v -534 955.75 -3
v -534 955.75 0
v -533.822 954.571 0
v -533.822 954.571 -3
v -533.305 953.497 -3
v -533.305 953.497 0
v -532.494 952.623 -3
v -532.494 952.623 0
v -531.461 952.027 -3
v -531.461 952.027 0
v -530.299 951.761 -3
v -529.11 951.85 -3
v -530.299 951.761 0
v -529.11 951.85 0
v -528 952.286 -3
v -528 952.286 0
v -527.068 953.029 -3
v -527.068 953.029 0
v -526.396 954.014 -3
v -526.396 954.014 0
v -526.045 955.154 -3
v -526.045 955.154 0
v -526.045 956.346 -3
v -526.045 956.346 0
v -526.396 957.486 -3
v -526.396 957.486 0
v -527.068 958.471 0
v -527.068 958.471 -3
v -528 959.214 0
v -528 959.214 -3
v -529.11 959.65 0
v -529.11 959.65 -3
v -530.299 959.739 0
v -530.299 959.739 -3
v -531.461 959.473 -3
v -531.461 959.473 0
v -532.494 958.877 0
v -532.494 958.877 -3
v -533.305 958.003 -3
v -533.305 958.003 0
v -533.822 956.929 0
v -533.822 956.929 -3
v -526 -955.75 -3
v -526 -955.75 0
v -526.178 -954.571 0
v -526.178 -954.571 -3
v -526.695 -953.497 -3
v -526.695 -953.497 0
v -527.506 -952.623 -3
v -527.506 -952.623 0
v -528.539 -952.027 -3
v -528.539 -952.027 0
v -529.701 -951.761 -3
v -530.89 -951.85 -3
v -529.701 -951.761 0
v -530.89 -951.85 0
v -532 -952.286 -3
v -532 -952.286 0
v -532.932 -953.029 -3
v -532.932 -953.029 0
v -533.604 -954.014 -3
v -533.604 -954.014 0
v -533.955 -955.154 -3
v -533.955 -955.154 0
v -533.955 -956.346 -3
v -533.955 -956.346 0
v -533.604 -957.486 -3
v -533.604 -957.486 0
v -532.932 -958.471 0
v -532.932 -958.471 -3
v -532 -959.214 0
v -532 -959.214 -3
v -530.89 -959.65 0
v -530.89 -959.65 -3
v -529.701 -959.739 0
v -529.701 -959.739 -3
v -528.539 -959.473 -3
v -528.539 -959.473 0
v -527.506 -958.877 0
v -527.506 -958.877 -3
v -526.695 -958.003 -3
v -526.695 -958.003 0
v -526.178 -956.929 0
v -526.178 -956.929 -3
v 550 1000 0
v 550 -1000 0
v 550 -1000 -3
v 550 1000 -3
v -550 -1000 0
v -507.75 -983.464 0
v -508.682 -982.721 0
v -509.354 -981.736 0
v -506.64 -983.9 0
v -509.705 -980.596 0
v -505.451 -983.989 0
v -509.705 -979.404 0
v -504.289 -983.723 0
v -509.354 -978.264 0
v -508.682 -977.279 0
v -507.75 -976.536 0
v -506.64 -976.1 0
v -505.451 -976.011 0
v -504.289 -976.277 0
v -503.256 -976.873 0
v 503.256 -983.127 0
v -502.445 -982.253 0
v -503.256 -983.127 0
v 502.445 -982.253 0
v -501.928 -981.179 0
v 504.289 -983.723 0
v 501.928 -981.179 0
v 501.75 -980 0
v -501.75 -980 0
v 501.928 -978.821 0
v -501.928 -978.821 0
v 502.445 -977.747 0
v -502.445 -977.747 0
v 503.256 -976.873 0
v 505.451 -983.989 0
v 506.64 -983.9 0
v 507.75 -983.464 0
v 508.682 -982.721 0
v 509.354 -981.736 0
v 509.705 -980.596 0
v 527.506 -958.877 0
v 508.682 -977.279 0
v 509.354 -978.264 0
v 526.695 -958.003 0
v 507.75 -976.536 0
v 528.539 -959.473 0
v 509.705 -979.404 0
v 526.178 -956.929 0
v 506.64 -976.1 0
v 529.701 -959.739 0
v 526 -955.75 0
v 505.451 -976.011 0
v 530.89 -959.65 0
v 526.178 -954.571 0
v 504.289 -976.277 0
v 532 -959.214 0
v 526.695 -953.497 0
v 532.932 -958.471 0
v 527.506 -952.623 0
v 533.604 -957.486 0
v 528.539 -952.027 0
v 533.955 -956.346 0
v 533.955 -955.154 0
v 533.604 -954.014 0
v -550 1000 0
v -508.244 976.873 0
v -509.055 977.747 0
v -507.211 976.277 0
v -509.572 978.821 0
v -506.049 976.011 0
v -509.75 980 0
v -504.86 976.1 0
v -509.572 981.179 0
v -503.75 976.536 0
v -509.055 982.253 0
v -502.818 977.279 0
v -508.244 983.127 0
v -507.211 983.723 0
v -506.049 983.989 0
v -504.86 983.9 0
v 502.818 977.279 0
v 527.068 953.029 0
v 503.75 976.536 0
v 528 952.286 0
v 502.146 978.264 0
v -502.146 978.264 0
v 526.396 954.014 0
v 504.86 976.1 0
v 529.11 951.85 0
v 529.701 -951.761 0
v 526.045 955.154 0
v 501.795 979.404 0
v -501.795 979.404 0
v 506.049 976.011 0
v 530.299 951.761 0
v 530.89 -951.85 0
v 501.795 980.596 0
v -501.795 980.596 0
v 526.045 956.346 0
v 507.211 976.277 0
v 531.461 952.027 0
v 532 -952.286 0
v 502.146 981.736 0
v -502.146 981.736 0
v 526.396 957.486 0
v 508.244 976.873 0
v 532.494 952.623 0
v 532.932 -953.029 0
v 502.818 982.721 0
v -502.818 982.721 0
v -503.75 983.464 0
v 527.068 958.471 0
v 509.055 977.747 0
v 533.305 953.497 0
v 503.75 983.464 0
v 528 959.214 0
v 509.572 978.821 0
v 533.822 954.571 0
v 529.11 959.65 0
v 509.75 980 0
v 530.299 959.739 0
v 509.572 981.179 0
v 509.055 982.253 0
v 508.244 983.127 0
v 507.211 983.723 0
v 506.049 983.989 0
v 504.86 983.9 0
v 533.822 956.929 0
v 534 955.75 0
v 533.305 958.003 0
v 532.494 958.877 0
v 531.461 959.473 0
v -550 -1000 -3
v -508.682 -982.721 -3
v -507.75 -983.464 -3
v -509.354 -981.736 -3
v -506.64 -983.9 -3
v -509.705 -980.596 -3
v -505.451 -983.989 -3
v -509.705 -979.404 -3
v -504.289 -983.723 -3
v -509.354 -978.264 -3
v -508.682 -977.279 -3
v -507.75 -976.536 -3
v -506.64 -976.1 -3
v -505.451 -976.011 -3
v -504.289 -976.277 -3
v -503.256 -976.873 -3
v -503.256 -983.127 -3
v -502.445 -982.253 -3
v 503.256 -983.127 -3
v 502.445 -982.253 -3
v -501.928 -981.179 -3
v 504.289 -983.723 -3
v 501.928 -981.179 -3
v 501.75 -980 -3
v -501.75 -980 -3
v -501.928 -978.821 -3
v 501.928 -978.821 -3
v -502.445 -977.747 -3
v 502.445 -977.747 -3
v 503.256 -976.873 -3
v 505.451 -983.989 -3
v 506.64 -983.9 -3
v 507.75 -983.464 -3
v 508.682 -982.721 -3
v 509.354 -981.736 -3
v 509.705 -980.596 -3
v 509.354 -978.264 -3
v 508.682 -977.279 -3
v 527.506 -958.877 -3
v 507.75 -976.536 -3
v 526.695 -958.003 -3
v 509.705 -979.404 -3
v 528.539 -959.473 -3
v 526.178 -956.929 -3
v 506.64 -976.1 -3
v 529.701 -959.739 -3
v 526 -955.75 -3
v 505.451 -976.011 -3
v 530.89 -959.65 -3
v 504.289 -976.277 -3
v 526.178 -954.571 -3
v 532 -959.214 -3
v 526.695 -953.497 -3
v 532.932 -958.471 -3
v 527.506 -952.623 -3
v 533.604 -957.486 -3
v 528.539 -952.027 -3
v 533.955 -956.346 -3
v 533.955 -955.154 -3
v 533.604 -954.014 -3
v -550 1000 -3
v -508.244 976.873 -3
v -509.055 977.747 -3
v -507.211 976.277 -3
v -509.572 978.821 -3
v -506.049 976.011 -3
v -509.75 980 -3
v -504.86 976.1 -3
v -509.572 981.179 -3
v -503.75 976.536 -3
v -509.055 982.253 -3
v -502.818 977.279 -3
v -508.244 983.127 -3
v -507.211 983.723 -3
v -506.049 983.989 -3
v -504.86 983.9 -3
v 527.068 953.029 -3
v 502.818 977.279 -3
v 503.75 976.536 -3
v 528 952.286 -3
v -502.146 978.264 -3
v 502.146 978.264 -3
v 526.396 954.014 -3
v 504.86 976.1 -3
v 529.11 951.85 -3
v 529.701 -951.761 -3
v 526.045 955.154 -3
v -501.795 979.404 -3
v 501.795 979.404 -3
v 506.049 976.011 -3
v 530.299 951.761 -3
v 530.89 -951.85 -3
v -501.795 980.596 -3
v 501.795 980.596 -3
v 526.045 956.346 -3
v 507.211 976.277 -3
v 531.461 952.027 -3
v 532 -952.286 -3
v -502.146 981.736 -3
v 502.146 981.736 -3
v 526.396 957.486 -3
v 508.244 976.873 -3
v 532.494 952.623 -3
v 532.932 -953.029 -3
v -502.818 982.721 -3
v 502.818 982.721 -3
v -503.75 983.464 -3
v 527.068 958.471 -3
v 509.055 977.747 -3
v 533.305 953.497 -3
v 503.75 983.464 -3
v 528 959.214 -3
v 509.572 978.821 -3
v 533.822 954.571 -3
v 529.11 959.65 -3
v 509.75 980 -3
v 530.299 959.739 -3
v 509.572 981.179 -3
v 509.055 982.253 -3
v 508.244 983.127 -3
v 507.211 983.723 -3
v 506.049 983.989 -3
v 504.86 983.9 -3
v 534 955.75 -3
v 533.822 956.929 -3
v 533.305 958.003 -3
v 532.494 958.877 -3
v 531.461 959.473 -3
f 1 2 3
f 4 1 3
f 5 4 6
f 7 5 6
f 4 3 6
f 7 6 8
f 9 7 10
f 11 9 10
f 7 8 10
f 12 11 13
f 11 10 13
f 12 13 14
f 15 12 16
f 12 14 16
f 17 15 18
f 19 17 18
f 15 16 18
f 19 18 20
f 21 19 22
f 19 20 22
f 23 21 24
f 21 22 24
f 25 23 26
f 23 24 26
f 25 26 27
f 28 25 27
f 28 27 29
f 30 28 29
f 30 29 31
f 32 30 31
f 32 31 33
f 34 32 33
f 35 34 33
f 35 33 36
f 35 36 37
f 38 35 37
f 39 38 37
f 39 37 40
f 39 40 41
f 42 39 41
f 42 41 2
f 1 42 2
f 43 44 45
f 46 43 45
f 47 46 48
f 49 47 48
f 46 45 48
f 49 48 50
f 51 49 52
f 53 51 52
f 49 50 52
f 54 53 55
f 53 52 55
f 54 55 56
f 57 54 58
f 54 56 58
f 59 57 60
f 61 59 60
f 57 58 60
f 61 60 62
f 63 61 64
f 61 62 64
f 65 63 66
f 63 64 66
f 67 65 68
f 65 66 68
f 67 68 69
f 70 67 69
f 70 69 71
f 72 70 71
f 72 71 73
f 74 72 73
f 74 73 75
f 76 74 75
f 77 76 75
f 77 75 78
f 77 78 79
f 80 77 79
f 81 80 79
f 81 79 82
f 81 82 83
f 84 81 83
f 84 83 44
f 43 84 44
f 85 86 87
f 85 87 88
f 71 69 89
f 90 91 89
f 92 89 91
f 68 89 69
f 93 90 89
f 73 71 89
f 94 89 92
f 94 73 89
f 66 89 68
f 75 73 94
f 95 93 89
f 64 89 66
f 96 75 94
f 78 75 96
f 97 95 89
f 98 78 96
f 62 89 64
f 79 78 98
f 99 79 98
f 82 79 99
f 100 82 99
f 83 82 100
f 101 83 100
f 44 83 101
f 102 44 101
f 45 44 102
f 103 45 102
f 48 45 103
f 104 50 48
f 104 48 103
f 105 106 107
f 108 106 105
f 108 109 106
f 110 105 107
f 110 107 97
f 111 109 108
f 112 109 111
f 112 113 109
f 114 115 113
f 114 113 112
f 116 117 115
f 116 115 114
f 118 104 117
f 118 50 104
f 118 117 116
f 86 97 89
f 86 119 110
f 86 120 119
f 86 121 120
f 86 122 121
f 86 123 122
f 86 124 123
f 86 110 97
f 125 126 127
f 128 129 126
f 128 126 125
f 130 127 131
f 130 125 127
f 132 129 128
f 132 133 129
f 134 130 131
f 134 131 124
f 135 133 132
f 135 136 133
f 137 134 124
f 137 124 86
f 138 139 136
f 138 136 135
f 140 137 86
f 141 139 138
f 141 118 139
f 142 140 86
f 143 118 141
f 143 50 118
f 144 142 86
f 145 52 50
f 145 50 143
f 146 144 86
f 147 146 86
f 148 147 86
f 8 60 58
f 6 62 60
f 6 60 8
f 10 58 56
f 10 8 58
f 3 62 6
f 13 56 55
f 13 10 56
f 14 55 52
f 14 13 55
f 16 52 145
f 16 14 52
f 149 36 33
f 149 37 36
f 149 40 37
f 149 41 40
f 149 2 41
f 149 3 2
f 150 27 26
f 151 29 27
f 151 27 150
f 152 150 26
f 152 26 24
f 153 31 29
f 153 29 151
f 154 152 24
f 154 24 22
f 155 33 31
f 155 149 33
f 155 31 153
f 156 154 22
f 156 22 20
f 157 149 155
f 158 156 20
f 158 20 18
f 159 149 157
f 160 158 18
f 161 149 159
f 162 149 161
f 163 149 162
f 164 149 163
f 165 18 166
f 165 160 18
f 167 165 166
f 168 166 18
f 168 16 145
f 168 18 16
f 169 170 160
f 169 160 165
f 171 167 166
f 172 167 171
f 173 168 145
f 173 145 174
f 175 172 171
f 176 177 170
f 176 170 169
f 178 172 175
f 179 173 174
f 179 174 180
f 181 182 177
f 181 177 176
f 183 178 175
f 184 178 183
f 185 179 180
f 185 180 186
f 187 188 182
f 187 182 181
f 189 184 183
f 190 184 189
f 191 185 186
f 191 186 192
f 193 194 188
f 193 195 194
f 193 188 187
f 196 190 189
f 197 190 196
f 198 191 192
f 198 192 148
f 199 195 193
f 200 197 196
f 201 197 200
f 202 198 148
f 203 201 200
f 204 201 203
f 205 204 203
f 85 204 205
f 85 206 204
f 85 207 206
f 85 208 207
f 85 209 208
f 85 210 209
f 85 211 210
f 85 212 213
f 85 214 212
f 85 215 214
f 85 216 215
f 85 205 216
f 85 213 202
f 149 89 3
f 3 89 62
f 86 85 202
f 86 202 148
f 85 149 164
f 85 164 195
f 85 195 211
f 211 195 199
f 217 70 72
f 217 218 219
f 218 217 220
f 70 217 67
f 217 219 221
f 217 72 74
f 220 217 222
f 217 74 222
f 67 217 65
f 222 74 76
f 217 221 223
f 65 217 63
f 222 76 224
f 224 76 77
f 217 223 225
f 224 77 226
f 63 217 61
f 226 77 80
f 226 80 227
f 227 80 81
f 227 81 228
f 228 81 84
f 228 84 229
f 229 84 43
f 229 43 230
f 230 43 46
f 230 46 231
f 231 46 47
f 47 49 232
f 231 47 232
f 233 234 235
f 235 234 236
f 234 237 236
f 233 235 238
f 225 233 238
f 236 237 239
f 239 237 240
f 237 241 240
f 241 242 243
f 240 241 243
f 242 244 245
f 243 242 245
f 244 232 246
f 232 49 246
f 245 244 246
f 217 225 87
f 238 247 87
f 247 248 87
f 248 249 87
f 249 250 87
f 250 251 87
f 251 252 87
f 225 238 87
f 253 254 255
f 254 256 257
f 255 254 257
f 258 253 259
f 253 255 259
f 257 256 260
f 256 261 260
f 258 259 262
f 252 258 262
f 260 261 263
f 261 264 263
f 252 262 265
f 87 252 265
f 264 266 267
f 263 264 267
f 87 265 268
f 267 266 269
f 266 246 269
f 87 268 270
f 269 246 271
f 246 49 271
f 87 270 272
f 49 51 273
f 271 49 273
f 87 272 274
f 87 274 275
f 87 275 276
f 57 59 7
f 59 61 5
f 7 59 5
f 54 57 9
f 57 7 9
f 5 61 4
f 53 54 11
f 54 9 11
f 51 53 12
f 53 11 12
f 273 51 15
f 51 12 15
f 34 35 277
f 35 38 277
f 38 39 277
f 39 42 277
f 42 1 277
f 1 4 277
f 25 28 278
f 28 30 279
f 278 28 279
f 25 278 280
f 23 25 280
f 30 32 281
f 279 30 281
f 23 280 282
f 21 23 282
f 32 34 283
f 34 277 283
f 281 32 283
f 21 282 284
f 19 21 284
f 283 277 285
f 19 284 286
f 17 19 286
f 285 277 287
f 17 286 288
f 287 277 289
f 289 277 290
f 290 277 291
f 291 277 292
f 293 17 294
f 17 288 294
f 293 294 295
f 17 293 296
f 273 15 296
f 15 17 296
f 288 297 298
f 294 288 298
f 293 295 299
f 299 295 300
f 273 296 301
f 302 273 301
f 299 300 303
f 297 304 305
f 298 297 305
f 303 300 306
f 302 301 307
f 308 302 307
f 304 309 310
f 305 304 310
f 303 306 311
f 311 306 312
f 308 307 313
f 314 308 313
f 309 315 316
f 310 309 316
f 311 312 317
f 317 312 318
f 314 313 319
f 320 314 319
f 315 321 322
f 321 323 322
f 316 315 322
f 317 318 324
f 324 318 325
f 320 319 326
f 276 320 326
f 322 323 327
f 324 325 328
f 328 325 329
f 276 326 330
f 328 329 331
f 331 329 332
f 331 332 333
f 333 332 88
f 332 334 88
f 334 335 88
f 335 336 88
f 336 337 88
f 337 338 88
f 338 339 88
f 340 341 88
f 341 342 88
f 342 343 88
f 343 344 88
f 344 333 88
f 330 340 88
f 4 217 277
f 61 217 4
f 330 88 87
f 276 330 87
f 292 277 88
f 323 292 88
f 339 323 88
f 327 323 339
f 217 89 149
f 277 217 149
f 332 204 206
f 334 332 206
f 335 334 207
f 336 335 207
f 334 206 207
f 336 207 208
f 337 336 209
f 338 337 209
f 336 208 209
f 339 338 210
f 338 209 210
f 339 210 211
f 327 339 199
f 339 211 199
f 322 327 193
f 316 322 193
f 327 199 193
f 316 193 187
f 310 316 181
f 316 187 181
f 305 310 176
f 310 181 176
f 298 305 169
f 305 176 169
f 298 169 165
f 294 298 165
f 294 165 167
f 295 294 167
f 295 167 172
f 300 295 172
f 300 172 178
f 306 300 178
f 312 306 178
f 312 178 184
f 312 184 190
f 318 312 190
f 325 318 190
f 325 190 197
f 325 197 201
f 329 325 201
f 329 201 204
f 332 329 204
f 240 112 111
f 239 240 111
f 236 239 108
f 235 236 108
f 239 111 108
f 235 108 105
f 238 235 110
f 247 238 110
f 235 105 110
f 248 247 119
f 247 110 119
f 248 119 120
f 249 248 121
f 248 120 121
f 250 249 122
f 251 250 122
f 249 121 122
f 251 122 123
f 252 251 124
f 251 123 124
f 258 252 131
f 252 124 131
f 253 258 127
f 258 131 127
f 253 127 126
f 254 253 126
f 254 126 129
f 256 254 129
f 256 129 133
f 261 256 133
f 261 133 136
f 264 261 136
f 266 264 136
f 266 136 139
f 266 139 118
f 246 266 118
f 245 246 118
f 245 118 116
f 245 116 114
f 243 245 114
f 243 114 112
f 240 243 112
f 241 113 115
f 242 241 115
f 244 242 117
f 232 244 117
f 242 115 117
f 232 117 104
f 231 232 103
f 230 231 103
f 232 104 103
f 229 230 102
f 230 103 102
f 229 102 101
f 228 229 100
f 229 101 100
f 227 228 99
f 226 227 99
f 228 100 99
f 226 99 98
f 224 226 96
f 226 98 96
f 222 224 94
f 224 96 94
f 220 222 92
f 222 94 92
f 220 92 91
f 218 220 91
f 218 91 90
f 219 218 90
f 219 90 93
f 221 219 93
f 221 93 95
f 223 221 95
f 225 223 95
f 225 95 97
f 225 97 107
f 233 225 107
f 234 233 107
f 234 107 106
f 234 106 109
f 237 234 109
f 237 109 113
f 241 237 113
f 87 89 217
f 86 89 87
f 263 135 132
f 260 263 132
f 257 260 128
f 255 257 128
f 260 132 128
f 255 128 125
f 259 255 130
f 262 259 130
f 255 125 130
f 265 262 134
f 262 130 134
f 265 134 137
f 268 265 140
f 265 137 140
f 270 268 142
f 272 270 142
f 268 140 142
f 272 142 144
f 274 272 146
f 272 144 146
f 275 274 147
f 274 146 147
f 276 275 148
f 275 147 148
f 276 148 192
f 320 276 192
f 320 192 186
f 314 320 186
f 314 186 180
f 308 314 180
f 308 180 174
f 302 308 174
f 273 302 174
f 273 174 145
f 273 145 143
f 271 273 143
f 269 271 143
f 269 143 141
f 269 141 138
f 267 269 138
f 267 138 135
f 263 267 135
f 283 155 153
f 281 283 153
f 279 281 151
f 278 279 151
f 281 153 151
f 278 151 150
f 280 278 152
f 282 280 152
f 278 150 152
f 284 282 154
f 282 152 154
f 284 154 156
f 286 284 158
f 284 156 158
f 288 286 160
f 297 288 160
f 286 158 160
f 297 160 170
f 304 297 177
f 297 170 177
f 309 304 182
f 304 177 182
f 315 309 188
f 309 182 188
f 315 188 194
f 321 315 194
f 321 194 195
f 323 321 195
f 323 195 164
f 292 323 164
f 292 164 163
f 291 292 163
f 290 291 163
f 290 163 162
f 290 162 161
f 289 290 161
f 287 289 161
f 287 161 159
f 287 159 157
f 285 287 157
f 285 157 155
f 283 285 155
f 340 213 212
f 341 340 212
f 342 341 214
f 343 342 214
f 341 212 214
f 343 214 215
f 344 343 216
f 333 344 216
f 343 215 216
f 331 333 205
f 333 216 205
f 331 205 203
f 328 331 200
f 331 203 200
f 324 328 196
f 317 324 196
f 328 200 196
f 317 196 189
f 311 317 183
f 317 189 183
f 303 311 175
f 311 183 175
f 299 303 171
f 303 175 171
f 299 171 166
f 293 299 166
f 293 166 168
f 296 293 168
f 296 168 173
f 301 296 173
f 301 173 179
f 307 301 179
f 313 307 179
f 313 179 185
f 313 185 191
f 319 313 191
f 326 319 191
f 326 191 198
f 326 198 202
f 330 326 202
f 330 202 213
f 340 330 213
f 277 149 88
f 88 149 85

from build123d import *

# Parameters (mm, degrees)
SCHIZZO1_W               = 1100
SCHIZZO1_H               = 2000
BASE_FLANGIA1_DEPTH      = 3
SCHIZZO2_R               = 4
TAGLIO_ESTRUSIONE1_DEPTH = 1142.275164016


# Sheet-metal steps are written as plain solids
with BuildPart() as part:
    # Schizzo1 → Base-Flangia1 (new body)
    with BuildSketch(Plane.XY):
        Rectangle(SCHIZZO1_W, SCHIZZO1_H)
    extrude(amount=-BASE_FLANGIA1_DEPTH)

    # Schizzo2 → Taglio-Estrusione1 (cut, through all)
    with BuildSketch(Plane.XY):
        with Locations((-530, -955.75)):
            Circle(SCHIZZO2_R)
        with Locations(Location((530, -955.75, 0), (0, 0, 180))):
            Circle(SCHIZZO2_R)
        with Locations(Location((-530, 955.75, 0), (0, 0, 180))):
            Circle(SCHIZZO2_R)
        with Locations((530, 955.75)):
            Circle(SCHIZZO2_R)
        with Locations((-505.75, -980)):
            Circle(SCHIZZO2_R)
        with Locations(Location((505.75, -980, 0), (0, 0, 180))):
            Circle(SCHIZZO2_R)
        with Locations((505.75, 980)):
            Circle(SCHIZZO2_R)
        with Locations(Location((-505.75, 980, 0), (0, 0, 180))):
            Circle(SCHIZZO2_R)
    extrude(amount=-TAGLIO_ESTRUSIONE1_DEPTH, mode=Mode.SUBTRACT)


solid = part.part
